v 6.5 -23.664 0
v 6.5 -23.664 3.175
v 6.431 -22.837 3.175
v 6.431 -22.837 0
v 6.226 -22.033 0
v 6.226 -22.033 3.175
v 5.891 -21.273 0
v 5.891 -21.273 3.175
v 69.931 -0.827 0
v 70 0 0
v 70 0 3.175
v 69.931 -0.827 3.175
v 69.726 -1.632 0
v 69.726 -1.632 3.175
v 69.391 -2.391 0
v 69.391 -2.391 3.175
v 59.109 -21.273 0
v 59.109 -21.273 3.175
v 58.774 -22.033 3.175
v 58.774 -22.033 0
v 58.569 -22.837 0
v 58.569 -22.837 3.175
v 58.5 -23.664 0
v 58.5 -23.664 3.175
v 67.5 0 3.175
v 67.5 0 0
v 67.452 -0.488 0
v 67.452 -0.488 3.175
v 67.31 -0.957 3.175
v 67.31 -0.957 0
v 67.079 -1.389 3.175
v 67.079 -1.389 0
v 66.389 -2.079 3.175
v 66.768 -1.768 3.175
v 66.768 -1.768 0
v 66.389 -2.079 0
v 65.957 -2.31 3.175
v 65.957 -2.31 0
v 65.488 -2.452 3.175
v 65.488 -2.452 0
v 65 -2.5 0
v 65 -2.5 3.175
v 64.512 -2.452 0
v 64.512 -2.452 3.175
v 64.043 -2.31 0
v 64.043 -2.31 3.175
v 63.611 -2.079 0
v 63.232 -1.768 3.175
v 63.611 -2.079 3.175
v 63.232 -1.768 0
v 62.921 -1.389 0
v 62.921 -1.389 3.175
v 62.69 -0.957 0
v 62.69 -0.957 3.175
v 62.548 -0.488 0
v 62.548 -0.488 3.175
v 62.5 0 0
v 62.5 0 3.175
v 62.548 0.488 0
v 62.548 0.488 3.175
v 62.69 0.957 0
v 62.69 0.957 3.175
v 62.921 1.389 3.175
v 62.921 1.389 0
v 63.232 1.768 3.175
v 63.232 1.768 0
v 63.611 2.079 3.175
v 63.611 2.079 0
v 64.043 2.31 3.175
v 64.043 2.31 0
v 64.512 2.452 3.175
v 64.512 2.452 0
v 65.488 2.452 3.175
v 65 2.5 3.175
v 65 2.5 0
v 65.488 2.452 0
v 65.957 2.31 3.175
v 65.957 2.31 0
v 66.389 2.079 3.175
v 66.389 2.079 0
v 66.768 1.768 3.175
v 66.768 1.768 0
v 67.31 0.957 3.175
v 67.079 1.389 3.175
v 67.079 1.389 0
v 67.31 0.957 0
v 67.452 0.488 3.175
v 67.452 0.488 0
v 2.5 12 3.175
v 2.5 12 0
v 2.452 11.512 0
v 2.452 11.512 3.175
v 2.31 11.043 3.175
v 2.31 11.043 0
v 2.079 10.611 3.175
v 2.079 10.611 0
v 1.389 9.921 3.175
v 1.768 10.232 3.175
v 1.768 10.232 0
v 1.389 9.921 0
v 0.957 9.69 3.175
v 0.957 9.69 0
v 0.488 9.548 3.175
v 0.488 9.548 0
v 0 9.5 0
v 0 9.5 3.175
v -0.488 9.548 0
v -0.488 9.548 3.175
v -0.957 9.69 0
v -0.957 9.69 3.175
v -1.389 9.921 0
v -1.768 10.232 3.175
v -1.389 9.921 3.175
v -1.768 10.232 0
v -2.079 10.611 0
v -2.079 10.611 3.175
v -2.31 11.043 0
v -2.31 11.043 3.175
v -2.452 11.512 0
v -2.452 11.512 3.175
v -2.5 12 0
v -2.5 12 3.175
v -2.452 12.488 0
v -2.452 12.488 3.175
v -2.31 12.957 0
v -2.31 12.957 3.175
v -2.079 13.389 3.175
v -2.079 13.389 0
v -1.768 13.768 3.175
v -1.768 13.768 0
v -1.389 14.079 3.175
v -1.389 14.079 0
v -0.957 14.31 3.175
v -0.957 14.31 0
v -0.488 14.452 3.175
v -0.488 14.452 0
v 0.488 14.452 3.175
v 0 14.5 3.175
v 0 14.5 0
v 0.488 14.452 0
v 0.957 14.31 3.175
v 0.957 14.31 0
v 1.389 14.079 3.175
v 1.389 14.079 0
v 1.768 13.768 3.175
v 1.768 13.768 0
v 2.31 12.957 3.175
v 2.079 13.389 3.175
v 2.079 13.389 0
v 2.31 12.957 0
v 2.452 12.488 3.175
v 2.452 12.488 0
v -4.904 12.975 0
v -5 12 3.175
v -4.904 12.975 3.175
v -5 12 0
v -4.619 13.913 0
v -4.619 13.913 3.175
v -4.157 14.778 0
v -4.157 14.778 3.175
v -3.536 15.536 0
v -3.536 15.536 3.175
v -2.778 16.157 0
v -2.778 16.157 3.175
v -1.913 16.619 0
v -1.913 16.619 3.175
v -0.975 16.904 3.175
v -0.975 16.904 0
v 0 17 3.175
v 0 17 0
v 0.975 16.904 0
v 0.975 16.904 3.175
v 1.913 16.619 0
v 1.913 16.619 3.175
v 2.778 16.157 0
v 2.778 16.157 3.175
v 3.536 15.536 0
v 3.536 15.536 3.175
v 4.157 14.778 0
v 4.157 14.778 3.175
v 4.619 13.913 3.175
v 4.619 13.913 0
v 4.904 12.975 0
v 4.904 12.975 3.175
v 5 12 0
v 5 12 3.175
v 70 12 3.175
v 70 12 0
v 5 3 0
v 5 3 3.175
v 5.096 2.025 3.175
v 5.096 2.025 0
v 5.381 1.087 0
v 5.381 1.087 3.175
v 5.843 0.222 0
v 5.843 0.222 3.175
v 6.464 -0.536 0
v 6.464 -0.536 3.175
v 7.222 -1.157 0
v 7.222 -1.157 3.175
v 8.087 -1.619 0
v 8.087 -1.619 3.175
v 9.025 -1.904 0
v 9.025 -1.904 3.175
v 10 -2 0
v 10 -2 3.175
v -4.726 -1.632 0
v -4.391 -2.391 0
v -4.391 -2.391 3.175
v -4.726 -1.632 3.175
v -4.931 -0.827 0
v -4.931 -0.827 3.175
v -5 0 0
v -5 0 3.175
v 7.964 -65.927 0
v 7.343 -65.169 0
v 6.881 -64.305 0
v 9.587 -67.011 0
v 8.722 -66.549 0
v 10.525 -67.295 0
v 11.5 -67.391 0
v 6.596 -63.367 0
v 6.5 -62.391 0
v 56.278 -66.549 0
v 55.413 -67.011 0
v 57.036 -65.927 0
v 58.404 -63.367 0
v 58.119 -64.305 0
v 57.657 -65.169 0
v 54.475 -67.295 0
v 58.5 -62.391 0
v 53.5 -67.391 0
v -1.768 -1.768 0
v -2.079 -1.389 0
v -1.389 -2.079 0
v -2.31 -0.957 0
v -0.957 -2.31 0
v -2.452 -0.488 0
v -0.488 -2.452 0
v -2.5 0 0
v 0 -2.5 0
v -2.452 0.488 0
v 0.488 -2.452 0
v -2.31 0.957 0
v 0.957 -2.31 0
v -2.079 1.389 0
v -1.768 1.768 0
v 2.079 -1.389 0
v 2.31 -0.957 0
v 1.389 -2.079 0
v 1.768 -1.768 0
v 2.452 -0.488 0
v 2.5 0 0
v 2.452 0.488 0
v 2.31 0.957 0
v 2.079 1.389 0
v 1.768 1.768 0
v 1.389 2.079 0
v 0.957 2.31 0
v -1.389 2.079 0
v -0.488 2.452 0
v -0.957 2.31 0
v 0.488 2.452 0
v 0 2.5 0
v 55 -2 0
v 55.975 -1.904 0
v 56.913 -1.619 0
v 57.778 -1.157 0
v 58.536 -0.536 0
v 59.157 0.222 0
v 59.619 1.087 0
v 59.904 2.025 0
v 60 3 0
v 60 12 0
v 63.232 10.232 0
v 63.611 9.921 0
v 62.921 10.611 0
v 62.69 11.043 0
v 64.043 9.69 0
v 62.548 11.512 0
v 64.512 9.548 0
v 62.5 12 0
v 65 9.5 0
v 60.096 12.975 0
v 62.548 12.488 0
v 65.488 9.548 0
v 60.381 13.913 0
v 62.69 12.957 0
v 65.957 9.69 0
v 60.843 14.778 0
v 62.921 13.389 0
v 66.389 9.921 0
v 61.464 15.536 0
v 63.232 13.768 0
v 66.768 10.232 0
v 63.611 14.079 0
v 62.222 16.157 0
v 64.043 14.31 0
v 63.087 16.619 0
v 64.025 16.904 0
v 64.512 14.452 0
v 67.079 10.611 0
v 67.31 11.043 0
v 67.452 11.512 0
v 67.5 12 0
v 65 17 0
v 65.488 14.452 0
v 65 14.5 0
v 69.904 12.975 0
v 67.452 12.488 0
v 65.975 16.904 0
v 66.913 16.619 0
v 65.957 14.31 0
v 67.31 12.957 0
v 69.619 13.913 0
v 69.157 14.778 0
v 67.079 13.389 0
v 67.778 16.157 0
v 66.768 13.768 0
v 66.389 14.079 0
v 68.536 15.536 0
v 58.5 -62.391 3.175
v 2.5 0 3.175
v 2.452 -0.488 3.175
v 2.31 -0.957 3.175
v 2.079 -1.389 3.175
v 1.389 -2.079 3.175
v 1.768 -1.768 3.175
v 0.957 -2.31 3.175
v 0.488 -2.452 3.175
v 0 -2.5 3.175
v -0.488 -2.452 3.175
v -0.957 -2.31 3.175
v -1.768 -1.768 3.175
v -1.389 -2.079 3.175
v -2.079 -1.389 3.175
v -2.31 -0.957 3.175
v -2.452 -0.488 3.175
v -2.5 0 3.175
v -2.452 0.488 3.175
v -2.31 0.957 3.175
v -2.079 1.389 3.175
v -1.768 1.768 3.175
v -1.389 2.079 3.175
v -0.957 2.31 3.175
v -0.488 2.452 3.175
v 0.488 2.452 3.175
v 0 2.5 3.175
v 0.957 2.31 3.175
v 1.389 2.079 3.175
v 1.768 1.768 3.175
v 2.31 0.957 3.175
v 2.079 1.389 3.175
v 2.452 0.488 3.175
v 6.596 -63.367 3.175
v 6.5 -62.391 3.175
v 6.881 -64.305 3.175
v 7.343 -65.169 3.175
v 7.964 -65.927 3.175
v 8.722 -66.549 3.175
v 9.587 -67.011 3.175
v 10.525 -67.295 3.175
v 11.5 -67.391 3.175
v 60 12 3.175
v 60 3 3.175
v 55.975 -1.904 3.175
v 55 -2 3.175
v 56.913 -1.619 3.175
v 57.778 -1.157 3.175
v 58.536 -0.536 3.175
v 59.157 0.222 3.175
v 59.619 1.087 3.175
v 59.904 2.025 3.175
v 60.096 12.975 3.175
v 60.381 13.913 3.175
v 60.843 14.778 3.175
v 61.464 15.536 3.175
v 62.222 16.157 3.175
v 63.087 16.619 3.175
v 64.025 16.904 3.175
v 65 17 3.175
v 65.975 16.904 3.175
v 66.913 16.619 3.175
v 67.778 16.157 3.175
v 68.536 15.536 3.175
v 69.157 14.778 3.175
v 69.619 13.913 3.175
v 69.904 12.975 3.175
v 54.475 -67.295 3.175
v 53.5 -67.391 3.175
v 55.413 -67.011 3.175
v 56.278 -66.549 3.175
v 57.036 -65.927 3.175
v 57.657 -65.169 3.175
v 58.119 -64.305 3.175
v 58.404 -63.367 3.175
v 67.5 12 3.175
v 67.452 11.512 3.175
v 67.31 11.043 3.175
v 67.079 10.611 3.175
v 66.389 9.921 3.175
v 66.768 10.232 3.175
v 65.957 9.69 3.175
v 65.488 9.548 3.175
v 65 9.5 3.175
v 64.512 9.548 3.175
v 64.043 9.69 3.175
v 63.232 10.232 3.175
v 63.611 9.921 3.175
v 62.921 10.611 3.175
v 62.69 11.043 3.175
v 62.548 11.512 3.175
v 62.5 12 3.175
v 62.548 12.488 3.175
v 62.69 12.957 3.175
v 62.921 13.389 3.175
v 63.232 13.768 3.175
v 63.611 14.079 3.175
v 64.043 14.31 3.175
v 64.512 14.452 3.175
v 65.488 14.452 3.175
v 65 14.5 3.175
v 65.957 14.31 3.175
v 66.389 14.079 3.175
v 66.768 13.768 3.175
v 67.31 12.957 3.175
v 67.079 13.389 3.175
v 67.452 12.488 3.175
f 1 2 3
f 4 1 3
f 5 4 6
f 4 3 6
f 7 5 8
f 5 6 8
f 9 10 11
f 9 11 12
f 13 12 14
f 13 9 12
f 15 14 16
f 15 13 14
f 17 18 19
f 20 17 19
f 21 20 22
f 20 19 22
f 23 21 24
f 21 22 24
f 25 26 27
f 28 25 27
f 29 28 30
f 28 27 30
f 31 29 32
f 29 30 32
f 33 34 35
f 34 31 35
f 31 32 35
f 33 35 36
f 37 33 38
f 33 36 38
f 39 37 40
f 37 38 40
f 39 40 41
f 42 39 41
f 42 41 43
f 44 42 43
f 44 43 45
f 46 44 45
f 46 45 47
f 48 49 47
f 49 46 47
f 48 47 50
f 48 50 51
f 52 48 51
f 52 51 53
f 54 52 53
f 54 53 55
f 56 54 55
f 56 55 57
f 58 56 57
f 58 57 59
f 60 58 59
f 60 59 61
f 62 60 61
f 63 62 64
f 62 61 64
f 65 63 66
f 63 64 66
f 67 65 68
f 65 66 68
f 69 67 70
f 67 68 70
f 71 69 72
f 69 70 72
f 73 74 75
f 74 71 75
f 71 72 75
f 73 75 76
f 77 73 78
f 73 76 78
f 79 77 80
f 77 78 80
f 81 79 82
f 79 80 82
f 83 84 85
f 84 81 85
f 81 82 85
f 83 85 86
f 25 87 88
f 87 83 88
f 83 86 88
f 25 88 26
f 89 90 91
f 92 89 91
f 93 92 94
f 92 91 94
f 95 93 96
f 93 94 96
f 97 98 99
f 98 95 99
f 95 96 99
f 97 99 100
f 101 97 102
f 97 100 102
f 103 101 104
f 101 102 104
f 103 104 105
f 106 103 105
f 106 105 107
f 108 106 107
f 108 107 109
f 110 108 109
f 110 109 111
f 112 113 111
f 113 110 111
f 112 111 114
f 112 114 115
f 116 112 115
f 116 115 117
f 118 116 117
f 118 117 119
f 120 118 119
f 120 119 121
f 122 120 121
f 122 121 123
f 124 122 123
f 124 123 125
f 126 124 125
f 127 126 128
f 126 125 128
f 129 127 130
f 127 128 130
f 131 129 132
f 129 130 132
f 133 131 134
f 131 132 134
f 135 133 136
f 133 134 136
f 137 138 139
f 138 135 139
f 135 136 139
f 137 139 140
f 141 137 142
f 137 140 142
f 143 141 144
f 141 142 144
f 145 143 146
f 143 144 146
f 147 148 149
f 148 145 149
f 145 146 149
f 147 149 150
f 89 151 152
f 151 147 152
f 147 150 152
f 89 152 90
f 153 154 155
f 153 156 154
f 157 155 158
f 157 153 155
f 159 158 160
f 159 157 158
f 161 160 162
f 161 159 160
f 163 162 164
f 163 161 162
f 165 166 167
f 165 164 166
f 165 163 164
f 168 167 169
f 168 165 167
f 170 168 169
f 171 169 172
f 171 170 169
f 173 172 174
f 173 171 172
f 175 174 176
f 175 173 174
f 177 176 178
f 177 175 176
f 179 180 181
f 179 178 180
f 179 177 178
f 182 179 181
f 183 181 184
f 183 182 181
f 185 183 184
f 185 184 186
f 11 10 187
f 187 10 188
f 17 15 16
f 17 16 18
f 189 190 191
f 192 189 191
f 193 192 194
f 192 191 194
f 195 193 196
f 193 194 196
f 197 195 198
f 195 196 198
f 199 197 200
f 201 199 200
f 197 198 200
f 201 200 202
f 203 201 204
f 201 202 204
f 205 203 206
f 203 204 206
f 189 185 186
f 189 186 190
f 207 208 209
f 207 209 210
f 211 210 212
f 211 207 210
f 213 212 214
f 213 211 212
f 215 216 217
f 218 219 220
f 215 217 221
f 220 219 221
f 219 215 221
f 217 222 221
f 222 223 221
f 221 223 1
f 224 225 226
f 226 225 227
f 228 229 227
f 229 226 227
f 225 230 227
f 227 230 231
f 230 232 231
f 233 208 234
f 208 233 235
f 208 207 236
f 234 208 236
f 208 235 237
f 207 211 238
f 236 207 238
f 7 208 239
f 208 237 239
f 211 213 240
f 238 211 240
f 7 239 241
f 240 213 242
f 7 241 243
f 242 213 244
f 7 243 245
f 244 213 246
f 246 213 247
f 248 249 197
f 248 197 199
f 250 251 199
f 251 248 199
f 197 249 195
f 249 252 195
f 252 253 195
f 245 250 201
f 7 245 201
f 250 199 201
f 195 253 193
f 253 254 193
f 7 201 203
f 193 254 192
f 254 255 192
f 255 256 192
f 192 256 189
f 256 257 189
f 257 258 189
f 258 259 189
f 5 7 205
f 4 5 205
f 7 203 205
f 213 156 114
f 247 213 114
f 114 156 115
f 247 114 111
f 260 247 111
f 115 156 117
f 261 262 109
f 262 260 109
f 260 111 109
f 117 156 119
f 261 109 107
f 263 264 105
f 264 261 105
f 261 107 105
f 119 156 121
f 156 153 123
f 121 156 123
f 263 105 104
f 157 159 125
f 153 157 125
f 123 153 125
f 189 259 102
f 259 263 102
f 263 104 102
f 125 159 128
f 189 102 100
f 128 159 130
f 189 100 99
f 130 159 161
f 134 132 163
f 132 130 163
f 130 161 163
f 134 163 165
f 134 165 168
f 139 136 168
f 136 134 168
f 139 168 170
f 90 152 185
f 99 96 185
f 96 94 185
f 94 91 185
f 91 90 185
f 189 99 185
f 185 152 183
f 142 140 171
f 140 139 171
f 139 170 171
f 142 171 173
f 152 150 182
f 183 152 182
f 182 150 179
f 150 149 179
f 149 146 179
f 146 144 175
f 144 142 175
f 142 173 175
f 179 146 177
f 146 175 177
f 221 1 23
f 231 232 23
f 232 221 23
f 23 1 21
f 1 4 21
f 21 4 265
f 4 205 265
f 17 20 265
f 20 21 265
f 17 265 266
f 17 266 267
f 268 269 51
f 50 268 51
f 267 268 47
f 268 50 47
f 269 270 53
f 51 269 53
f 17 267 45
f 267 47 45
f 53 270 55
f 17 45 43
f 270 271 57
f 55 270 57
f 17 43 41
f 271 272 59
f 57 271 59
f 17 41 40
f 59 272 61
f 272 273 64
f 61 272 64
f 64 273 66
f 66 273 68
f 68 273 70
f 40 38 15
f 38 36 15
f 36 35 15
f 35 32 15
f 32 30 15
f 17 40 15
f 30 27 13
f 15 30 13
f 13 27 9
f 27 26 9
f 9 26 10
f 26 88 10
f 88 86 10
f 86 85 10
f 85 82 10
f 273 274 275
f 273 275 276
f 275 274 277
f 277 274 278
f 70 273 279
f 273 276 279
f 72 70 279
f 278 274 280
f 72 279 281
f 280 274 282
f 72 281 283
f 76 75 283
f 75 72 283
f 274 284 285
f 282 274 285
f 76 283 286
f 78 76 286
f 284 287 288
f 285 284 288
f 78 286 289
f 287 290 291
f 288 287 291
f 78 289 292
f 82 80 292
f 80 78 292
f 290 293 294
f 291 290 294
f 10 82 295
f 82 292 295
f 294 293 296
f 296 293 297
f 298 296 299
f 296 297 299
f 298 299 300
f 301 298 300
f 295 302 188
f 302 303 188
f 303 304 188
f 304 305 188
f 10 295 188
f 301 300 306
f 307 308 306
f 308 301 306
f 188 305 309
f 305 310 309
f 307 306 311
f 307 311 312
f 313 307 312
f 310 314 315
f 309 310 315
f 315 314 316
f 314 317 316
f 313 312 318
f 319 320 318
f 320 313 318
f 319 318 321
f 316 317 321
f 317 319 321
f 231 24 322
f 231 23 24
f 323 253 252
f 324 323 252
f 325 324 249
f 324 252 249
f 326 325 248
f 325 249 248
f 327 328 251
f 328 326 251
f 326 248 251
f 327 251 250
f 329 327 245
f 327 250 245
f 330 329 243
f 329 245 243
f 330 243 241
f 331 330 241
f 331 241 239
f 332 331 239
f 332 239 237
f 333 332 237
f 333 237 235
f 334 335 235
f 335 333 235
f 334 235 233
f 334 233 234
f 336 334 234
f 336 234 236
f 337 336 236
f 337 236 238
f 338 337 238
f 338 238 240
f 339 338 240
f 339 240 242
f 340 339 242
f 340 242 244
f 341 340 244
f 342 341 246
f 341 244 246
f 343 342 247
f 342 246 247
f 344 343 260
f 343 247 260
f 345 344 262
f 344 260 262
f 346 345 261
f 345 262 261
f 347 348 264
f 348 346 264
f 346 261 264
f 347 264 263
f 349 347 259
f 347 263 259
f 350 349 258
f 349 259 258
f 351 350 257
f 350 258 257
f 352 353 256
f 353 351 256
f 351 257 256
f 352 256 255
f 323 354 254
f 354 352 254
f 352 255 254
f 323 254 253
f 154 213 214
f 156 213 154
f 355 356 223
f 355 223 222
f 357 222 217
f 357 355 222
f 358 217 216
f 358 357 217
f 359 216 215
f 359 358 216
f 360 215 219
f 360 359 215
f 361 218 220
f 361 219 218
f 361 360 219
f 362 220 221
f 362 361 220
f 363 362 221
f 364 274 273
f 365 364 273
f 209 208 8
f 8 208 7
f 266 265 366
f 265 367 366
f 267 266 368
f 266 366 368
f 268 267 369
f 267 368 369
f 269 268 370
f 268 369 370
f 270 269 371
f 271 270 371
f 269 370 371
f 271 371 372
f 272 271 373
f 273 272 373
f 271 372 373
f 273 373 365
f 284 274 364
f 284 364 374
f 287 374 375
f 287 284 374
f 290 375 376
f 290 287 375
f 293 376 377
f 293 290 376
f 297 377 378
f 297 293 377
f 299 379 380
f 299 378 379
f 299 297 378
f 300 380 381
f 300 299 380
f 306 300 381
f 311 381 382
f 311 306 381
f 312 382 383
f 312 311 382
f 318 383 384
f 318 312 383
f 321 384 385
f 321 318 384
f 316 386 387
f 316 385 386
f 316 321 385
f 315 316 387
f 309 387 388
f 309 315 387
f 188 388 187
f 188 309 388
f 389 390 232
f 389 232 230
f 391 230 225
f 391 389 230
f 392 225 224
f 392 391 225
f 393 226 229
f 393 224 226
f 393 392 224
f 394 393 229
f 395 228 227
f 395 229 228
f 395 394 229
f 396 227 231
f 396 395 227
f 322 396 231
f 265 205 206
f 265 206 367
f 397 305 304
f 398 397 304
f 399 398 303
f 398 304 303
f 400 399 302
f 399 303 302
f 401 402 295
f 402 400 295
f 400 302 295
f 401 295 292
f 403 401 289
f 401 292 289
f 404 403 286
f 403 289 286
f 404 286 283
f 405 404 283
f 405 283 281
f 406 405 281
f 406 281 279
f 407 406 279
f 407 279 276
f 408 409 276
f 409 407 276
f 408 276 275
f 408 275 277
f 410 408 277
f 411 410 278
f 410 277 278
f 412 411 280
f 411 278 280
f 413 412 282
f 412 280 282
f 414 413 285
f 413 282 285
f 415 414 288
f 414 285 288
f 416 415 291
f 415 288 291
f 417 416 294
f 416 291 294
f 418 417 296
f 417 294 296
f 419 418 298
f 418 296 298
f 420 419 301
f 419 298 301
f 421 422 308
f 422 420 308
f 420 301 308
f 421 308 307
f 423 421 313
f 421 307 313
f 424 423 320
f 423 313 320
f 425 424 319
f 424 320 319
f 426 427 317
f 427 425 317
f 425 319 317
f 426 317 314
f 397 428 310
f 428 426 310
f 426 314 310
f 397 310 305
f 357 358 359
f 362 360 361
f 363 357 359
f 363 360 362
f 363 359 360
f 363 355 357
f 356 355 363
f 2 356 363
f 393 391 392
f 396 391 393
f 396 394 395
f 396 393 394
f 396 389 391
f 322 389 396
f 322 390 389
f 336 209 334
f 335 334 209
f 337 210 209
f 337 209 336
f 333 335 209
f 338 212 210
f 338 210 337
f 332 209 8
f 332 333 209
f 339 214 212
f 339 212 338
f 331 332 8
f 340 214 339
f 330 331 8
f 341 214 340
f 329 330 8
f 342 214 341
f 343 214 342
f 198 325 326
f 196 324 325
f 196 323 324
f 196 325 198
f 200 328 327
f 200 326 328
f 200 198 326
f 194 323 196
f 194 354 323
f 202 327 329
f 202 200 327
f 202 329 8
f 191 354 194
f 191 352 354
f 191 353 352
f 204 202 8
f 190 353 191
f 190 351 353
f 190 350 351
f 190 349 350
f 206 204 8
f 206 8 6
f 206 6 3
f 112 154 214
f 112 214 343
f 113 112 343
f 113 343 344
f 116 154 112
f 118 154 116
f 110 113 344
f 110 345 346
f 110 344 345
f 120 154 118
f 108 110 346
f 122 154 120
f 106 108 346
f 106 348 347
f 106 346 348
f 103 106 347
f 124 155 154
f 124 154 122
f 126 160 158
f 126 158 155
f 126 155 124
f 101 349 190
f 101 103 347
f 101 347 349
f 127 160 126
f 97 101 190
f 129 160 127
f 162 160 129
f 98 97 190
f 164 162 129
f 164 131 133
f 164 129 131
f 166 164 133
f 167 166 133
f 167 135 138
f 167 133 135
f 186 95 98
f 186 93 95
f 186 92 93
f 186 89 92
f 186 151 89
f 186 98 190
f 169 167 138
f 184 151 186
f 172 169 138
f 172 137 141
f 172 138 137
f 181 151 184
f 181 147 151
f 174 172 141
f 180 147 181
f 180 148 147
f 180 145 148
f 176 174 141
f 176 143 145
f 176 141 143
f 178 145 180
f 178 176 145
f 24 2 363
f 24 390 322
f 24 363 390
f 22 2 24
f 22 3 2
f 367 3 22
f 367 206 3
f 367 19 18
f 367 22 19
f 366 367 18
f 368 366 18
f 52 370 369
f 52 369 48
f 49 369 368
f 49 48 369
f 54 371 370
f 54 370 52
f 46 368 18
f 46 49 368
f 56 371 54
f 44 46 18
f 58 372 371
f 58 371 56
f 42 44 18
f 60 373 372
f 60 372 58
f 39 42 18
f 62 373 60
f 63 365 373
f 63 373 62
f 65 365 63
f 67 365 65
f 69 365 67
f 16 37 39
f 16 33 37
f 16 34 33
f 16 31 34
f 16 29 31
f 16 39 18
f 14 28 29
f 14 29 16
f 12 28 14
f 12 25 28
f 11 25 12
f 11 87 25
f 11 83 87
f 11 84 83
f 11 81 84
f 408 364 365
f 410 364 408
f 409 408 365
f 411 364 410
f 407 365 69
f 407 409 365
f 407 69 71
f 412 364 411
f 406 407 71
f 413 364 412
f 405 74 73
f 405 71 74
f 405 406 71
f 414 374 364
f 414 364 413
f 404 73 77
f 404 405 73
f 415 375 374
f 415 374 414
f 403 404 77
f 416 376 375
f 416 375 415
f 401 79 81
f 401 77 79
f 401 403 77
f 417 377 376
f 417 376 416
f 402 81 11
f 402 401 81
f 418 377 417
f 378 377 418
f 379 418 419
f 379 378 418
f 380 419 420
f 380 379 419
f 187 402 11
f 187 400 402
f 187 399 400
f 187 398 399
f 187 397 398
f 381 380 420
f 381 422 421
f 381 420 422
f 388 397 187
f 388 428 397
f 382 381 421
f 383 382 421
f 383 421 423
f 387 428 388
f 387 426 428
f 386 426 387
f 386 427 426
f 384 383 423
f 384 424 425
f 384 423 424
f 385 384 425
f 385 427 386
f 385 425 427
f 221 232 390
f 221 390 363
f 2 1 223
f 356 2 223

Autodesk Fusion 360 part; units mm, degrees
sketch "Sketch1" plane through (0, 0, 0) normal (0, 0, 1) x (1, 0, 0)
  circle A0 centre (0, 0) radius 2.5
  circle A1 centre (0, 12) radius 2.5
  circle A2 centre (65, 0) radius 2.5
  circle A3 centre (0, 12) radius 5
  line L0 (5, -2) -> (60, -2)
  line L1 (5, 12) -> (5, -2)
  circle A4 centre (0, 0) radius 5
  line L2 (-5, 0) -> (-5, 12)
  line L3 (0, 0) -> (65, 0) construction
  line L4 (32.5, 0) -> (32.5, -19.0435) construction
  line L5 (4.5, -9.5218) -> (60.5, -9.5218) construction
  line L6 (-4.3911, -2.3912) -> (6.5, -22.3912)
  line L7 (6.5, -22.3912) -> (6.5, -67.3912)
  line L8 (6.5, -67.3912) -> (32.5, -67.3912)
  line L9 (58.5, -67.3912) -> (32.5, -67.3912)
  line L10 (58.5, -22.3912) -> (58.5, -67.3912)
  line L11 (69.3911, -2.3912) -> (58.5, -22.3912)
  circle A5 centre (65, 0) radius 5
  line L12 (70, 0) -> (70, 12)
  circle A6 centre (65, 12) radius 5
  line L13 (60, 12) -> (60, -2)
  circle A7 centre (65, 12) radius 2.5
  dimension "d1" = 5
  dimension "d2" = 5
  dimension "d3" = 5
  dimension "d5" = 12
  dimension "d6" = 65
  dimension "d9" = 2
  dimension "d10" = 10
  dimension "d12" = 56
  dimension "d13" = 45
  dimension "d14" = 26
  dimension "d15" = 20
extrude "Extrude1" add sketch "Sketch1" along normal blind 3.175
fillet "Fillet1" radius 5 6 edges at (5, -2, 1.5875) (60, -2, 1.5875) (58.5, -67.3912, 1.5875) (6.5, -67.3912, 1.5875) (58.5, -22.3912, 1.5875) (6.5, -22.3912, 1.5875)
